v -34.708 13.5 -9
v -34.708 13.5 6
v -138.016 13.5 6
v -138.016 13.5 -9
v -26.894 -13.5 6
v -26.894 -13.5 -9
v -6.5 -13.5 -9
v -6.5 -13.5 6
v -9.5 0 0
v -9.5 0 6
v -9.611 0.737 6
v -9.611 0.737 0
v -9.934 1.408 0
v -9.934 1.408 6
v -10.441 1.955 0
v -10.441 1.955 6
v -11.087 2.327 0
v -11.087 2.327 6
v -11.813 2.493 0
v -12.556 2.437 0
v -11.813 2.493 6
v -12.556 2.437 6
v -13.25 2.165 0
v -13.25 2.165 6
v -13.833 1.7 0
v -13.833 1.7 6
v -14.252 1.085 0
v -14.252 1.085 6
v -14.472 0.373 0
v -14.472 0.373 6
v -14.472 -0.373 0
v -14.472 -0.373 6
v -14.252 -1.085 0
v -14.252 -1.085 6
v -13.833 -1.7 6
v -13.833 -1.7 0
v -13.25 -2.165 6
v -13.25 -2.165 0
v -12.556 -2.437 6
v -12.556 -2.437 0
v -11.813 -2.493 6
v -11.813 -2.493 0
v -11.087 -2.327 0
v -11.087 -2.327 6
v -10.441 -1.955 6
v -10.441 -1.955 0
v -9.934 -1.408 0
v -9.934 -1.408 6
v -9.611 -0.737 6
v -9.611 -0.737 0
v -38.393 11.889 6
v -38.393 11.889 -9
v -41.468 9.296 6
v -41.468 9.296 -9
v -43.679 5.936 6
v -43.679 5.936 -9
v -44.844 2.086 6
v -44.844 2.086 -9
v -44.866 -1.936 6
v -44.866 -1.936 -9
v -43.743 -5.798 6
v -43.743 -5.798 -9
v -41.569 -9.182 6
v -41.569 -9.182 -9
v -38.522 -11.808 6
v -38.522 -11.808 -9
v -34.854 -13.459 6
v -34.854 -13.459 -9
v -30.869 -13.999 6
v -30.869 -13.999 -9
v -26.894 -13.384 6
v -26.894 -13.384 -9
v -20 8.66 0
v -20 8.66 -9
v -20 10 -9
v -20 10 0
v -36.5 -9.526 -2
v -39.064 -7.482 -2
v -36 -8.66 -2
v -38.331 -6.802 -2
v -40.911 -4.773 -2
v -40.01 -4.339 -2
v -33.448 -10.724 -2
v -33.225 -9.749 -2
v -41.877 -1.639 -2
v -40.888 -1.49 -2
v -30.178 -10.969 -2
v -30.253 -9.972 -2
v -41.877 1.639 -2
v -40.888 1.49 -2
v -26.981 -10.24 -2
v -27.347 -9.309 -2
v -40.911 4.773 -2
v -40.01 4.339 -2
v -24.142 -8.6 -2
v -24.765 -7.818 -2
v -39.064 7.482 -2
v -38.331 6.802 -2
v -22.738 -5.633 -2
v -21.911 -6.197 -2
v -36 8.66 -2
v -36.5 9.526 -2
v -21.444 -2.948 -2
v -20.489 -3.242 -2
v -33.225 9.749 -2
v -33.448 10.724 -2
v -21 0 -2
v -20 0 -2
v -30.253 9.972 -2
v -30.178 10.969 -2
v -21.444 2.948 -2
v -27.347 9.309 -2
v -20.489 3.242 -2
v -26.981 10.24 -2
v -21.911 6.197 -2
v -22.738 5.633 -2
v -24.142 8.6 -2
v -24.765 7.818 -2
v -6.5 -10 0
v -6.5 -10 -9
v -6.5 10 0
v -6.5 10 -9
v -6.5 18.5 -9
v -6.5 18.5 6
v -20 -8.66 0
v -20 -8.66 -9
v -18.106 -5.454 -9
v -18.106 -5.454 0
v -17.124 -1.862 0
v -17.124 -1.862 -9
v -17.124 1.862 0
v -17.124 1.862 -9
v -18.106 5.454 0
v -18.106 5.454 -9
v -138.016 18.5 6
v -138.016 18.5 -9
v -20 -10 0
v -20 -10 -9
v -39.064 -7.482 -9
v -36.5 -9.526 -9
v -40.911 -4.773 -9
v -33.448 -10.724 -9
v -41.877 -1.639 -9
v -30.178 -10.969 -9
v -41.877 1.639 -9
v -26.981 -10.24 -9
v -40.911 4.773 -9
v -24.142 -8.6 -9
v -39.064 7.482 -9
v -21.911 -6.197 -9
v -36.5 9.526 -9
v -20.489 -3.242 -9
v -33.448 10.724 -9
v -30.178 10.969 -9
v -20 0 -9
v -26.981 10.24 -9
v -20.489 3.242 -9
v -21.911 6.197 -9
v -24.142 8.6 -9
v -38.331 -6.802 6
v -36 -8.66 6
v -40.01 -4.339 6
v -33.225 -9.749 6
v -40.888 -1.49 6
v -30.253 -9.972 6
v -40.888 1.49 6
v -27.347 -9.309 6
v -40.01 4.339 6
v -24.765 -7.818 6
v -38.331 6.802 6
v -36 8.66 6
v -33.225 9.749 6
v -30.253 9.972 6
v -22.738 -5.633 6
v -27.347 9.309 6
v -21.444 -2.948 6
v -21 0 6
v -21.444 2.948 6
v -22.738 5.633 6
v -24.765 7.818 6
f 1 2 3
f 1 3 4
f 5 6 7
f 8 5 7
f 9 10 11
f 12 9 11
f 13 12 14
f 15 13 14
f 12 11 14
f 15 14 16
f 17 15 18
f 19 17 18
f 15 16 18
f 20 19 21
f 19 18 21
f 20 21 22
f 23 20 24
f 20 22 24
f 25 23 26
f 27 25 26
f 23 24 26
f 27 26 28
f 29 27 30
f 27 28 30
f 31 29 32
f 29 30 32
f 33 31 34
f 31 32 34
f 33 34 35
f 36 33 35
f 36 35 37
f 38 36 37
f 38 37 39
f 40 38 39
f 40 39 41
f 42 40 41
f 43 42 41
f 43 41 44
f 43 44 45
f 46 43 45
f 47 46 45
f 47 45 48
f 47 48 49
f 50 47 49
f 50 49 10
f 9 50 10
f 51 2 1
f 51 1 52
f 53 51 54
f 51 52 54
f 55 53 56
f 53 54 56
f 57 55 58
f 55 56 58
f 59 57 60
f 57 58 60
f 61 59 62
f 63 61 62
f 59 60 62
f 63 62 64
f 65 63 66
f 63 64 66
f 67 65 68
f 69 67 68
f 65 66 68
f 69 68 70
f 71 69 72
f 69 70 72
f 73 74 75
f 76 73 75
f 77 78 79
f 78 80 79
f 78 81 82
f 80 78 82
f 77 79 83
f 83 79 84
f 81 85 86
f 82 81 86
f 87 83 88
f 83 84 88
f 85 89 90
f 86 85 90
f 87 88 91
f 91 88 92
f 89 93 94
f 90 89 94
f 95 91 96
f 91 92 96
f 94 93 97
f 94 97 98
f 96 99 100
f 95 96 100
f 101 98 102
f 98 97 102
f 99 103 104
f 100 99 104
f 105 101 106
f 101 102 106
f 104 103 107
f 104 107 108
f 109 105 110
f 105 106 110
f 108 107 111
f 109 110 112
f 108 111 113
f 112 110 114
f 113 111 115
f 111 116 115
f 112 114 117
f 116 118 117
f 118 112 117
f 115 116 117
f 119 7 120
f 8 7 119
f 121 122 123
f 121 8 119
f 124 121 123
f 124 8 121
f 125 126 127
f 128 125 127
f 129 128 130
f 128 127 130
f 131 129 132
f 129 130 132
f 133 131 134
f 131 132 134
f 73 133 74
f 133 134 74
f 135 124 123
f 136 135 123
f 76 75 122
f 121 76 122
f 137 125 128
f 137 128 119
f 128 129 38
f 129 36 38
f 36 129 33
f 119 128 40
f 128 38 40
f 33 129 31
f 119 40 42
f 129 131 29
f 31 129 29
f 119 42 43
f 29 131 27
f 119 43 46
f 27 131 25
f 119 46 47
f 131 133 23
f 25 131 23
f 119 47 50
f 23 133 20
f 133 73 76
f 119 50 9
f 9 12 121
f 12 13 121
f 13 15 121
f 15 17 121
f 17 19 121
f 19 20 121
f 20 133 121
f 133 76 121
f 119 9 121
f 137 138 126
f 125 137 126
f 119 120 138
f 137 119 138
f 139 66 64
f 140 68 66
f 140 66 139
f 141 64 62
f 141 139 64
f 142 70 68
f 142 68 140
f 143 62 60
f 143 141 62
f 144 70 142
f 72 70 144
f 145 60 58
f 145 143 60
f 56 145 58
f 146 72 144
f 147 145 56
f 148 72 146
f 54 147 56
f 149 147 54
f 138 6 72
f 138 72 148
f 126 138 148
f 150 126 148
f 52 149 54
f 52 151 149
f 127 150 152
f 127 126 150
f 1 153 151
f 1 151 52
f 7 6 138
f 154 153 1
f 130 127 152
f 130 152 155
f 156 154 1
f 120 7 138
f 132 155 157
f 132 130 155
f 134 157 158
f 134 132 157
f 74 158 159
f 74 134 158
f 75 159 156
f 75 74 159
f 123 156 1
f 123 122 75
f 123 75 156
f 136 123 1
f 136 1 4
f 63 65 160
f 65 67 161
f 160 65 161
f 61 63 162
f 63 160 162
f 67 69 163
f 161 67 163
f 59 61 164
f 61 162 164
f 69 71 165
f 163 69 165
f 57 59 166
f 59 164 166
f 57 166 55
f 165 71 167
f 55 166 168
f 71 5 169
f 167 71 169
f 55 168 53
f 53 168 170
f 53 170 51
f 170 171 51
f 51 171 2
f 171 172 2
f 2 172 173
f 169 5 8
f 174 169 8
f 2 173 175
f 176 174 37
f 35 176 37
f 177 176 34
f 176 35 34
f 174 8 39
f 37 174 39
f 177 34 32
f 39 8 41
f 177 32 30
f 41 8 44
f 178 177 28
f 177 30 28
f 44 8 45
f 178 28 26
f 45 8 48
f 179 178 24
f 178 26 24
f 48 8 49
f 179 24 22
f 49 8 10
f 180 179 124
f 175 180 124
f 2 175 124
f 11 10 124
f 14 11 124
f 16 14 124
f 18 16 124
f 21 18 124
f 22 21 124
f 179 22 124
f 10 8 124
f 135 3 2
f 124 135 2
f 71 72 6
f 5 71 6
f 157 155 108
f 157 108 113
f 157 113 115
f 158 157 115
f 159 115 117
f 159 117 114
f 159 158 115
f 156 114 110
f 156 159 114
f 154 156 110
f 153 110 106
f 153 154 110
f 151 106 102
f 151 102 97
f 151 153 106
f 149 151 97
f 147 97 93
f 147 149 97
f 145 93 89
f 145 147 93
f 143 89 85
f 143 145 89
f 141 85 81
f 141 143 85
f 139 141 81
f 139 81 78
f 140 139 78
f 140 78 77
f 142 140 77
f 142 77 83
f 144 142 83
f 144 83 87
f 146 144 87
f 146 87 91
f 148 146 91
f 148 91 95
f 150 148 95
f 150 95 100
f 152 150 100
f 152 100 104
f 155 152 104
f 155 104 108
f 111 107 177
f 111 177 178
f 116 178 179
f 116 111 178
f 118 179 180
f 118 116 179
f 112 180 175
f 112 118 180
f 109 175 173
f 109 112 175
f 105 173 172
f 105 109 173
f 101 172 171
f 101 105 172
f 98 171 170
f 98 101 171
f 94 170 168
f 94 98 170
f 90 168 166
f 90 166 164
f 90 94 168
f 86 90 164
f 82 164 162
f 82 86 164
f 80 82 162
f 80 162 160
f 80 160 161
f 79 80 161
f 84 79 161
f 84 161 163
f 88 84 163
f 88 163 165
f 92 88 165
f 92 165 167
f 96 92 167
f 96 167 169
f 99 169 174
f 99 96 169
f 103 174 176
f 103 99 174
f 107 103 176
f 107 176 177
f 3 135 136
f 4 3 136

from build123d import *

# Parameters (mm, degrees)
SKETCH_1_W          = 40
SKETCH_1_H          = 20
EXTRUDE_1_DEPTH     = 6
SKETCH_2_R          = 2.5
CUT_EXTRUDE_1_DEPTH = 24.151673806
EXTRUDE_START       = -15
EXTRUDE_2_OUTLINE_R = 11
EXTRUDE_2_DEPTH     = 15
EXTRUDE_START_2     = -8
SKETCH_5_R          = 11
SKETCH_5_R_2        = 10
EXTRUDE_3_DEPTH     = 8
SKETCH_8_W          = 15
SKETCH_8_H          = 5
EXTRUDE_4_DEPTH     = 500
SKETCH_9_W          = 4.037306924
SKETCH_9_H          = 3.364422437
EXTRUDE_5_DEPTH     = 15
SKETCH_10_W         = 26.5
SKETCH_10_H         = 32
CUT_EXTRUDE_2_DEPTH = 481.59052217
SKETCH_12_W         = 363.719511947
SKETCH_12_H         = 27.53578134
CUT_EXTRUDE_3_DEPTH = 482.183177179


# Read off the part's stored shape, not the designer's step: 凸台-拉伸2
with BuildPart() as part:
    # 草图1 → 凸台-拉伸1 (new body)
    with BuildSketch(Plane.XY):
        Rectangle(SKETCH_1_W, SKETCH_1_H)
    extrude(amount=EXTRUDE_1_DEPTH)

    # 草图2 → 切除-拉伸1 (cut, through all)
    with BuildSketch(Plane.XY.offset(6)):
        with Locations((10, 0)):
            Circle(SKETCH_2_R)
        with Locations((-1, 0)):
            Circle(SKETCH_2_R)
        with Locations((-12, 0)):
            Circle(SKETCH_2_R)
    extrude(amount=-CUT_EXTRUDE_1_DEPTH, mode=Mode.SUBTRACT)

    # 凸台-拉伸2 outline → 凸台-拉伸2 (add)
    with BuildSketch(Plane.XY.offset(6).offset(EXTRUDE_START)):
        with BuildLine():
            Line((20, 10), (20, 13.5))
            Line((20, 13.5), (-26.893967141, 13.5))
            Line((-26.893967141, 13.5), (-26.893967141, 13.384337644))
            ThreePointArc((-26.893967141, 13.384337644), (-45, 0), (-26.893967141, -13.384337644))
            Line((-26.893967141, -13.384337644), (-26.893967141, -13.5))
            Line((-26.893967141, -13.5), (20, -13.5))
            Line((20, -13.5), (20, -10))
            Line((20, -10), (-20, -10))
            Line((-20, -10), (-20, -8.660254038))
            ThreePointArc((-20, -8.660254038), (-17, 0), (-20, 8.660254038))
            Line((-20, 8.660254038), (-20, 10))
            Line((-20, 10), (20, 10))
        make_face()
        with Locations((-31, 0)):
            Circle(EXTRUDE_2_OUTLINE_R, mode=Mode.SUBTRACT)
    extrude(amount=EXTRUDE_2_DEPTH)

    # 草图5 → 凸台-拉伸3 (add)
    with BuildSketch(Plane.XY.offset(6).offset(EXTRUDE_START_2)):
        with Locations((-31, 0)):
            Circle(SKETCH_5_R)
        with Locations((-31, 0)):
            Circle(SKETCH_5_R_2, mode=Mode.SUBTRACT)
    extrude(amount=EXTRUDE_3_DEPTH)

    # 草图8 → 凸台-拉伸4 (add)
    with BuildSketch(Plane(origin=(20, 0, 0), x_dir=(0, 0, -1), z_dir=(1, 0, 0))):
        with Locations((1.5, 16)):
            Rectangle(SKETCH_8_W, SKETCH_8_H)
    extrude(amount=-EXTRUDE_4_DEPTH)

    # 草图9 → 凸台-拉伸5 (add, through all)
    with BuildSketch(Plane(origin=(0, 0, -9), x_dir=(-1, 0, 0), z_dir=(0, 0, -1))):
        with Locations((26.475334378, 14.151164675)):
            Rectangle(SKETCH_9_W, SKETCH_9_H)
    extrude(amount=-EXTRUDE_5_DEPTH)

    # 草图10 → 切除-拉伸2 (cut, through all)
    with BuildSketch(Plane.XY.offset(6)):
        with Locations((6.75, 2.5)):
            Rectangle(SKETCH_10_W, SKETCH_10_H)
    extrude(amount=-CUT_EXTRUDE_2_DEPTH, mode=Mode.SUBTRACT)

    # 草图12 → 切除-拉伸3 (cut, through all)
    with BuildSketch(Plane(origin=(0, 18.5, 0), x_dir=(1, 0, 0), z_dir=(0, 1, 0))):
        with Locations((-319.875382276, 7.753964269)):
            Rectangle(SKETCH_12_W, SKETCH_12_H)
    extrude(amount=-CUT_EXTRUDE_3_DEPTH, mode=Mode.SUBTRACT)


solid = part.part
